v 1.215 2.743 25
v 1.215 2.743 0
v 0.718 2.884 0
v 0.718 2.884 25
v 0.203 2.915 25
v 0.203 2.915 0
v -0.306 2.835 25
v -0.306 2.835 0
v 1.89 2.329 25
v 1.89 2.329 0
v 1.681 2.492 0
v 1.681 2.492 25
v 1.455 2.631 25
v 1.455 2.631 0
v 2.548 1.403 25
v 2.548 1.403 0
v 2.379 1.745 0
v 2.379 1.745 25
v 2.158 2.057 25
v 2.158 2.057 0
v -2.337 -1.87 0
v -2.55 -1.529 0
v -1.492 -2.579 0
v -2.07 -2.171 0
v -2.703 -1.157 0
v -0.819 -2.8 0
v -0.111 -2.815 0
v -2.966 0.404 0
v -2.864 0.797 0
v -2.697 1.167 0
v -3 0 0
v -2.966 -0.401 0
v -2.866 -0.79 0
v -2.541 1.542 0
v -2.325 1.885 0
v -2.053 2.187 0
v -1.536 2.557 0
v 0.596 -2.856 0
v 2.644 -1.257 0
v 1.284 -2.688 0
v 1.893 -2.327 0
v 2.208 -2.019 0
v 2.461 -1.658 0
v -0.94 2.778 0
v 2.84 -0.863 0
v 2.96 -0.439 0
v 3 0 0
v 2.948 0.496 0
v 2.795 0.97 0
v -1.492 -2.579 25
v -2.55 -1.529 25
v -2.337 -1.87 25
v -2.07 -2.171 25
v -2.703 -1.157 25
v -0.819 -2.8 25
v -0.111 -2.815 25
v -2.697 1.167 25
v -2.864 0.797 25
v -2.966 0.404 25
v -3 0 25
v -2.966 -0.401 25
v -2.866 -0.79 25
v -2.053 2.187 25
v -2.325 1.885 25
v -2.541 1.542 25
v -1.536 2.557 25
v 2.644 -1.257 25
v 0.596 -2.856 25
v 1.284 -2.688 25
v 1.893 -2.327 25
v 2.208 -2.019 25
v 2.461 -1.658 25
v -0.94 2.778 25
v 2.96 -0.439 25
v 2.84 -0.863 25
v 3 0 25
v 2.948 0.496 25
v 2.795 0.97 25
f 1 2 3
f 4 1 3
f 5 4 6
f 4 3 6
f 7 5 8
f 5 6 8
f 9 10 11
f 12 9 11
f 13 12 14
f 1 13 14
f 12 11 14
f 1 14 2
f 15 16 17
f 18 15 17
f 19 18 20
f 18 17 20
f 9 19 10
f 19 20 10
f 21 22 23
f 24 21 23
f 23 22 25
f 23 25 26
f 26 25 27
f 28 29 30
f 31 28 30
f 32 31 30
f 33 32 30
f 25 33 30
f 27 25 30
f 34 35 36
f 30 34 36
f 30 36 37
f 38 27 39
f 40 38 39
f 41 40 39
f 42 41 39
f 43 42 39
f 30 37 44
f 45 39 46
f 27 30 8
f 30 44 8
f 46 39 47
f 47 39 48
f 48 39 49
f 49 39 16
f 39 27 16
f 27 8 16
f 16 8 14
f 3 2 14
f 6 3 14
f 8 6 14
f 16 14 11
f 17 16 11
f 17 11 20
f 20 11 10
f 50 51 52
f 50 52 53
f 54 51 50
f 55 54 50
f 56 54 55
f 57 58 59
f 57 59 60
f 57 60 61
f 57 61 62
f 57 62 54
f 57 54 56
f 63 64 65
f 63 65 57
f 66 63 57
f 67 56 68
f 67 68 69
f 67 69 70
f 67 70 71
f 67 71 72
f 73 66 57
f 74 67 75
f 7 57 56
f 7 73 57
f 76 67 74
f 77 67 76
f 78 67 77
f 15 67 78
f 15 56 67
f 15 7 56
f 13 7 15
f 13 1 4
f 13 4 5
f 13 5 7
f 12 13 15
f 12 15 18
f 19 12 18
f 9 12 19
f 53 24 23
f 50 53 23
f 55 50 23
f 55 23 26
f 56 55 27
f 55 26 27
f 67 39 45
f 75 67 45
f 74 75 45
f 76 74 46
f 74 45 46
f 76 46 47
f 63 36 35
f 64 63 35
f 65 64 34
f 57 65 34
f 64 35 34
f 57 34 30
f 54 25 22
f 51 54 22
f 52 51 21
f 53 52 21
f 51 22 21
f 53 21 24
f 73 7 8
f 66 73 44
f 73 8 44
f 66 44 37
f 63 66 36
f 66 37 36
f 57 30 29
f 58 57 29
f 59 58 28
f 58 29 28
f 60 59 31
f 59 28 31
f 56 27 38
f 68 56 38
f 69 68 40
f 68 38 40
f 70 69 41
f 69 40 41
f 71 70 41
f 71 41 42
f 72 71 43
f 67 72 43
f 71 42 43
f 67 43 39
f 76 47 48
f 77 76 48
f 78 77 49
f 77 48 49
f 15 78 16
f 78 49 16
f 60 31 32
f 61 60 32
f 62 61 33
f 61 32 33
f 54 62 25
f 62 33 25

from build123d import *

# Parameters (mm, degrees)
F1_DEPTH = 25


with BuildPart() as f1:
    # F0 (on Top) → F1 (new body)
    with BuildSketch(Plane.XY):
        with BuildLine():
            ThreePointArc((1.2145237572, 2.7431609583), (1.5661560246, 2.5587409612), (1.8903534171, 2.3294986496))
            ThreePointArc((1.8903534171, 2.3294986496), (1.5696282097, 2.5644137181), (1.2145237572, 2.7431609583))
        make_face()
        with BuildLine():
            ThreePointArc((-2.6971494632, 1.1670321884), (-2.9230538866, 0.602843794), (-3, -7.1e-09))
            ThreePointArc((-3, -7.1e-09), (-2.9244950269, -0.5972628147), (-2.7027309452, -1.1569453626))
            ThreePointArc((-2.7027309452, -1.1569453626), (-2.8098534543, -0.5773803496), (-2.7724957206, 0.0108162466))
            ThreePointArc((-2.7724957206, 0.0108162466), (-2.8056442701, 0.5935394007), (-2.6971494632, 1.1670321884))
        make_face()
        with BuildLine():
            ThreePointArc((0, 2.3237900077), (0.5091765934, 2.3982808653), (1.0225286934, 2.3625133869))
            ThreePointArc((1.0225286934, 2.3625133869), (0.3936943594, 2.6986461258), (-0.3061435643, 2.8351917902))
            ThreePointArc((-0.3061435643, 2.8351917902), (-0.8312662298, 2.6250655472), (-1.2926313697, 2.2978820217))
            ThreePointArc((-1.2926313697, 2.2978820217), (-0.6480931242, 2.3995180873), (0, 2.3237900077))
        make_face()
        with BuildLine():
            ThreePointArc((-0.3061435643, 2.8351917902), (-1.2452617924, 2.6877040375), (-2.0534480514, 2.1871736645))
            ThreePointArc((-2.0534480514, 2.1871736645), (-2.4404348522, 1.7182033005), (-2.6971494632, 1.1670321884))
            ThreePointArc((-2.6971494632, 1.1670321884), (-2.1051327551, 1.8693783431), (-1.2926313697, 2.2978820217))
            ThreePointArc((-1.2926313697, 2.2978820217), (-0.8312662298, 2.6250655472), (-0.3061435643, 2.8351917902))
        make_face()
        with BuildLine():
            ThreePointArc((-1.891761125, 1.4569338473), (-2.4638935619, 0.8141244793), (-2.7724957206, 0.0108162466))
            ThreePointArc((-2.7724957206, 0.0108162466), (-2.4250170931, -0.8673747652), (-1.7656165001, -1.5435047142))
            ThreePointArc((-1.7656165001, -1.5435047142), (-1.9902787019, -0.8503911859), (-1.9966041151, -0.1218038835))
            ThreePointArc((-1.9966041151, -0.1218038835), (-2.0780218042, 0.6764531589), (-1.891761125, 1.4569338473))
        make_face()
        with BuildLine():
            ThreePointArc((-1.2926313697, 2.2978820217), (-2.1051327551, 1.8693783431), (-2.6971494632, 1.1670321884))
            ThreePointArc((-2.6971494632, 1.1670321884), (-2.8056442701, 0.5935394007), (-2.7724957206, 0.0108162466))
            ThreePointArc((-2.7724957206, 0.0108162466), (-2.4638935619, 0.8141244793), (-1.891761125, 1.4569338473))
            ThreePointArc((-1.891761125, 1.4569338473), (-1.6379567553, 1.9100098031), (-1.2926313697, 2.2978820217))
        make_face()
        with BuildLine():
            ThreePointArc((-1.6655926226, 0.7918901872), (-1.3317700546, 1.4241714982), (-0.8264971382, 1.930053345))
            ThreePointArc((-0.8264971382, 1.930053345), (-1.3882878833, 1.7591467098), (-1.891761125, 1.4569338473))
            ThreePointArc((-1.891761125, 1.4569338473), (-2.0780218042, 0.6764531589), (-1.9966041151, -0.1218038835))
            ThreePointArc((-1.9966041151, -0.1218038835), (-1.8778287416, 0.3519725497), (-1.6655926226, 0.7918901872))
        make_face()
        with BuildLine():
            ThreePointArc((-0.8264971382, 1.930053345), (-0.4321965911, 2.1666956864), (0, 2.3237900077))
            ThreePointArc((0, 2.3237900077), (-0.6480931242, 2.3995180873), (-1.2926313697, 2.2978820217))
            ThreePointArc((-1.2926313697, 2.2978820217), (-1.6379567553, 1.9100098031), (-1.891761125, 1.4569338473))
            ThreePointArc((-1.891761125, 1.4569338473), (-1.3882878833, 1.7591467098), (-0.8264971382, 1.930053345))
        make_face()
        with BuildLine():
            ThreePointArc((0.8936048083, 1.8786017876), (0.4702071814, 2.1481751765), (0, 2.3237900077))
            ThreePointArc((0, 2.3237900077), (-0.4321965911, 2.1666956864), (-0.8264971382, 1.930053345))
            ThreePointArc((-0.8264971382, 1.930053345), (-0.3748003349, 1.9654238069), (0.0754949738, 1.9152719716))
            ThreePointArc((0.0754949738, 1.9152719716), (0.4861255229, 1.9320891402), (0.8936048083, 1.8786017876))
        make_face()
        with BuildLine():
            ThreePointArc((1.7335505231, 1.5154725868), (1.4274938242, 1.9805057771), (1.0225286934, 2.3625133869))
            ThreePointArc((1.0225286934, 2.3625133869), (0.5091765934, 2.3982808653), (0, 2.3237900077))
            ThreePointArc((0, 2.3237900077), (0.4702071814, 2.1481751765), (0.8936048083, 1.8786017876))
            ThreePointArc((0.8936048083, 1.8786017876), (1.3310447327, 1.7374398538), (1.7335505231, 1.5154725868))
        make_face()
        with BuildLine():
            ThreePointArc((2.5475158106, 1.4025627142), (2.2745813704, 1.90548212), (1.8903534171, 2.3294986496))
            ThreePointArc((1.8903534171, 2.3294986496), (1.5661560246, 2.5587409612), (1.2145237572, 2.7431609583))
            ThreePointArc((1.2145237572, 2.7431609583), (0.4616861922, 2.9130377773), (-0.3061435643, 2.8351917902))
            ThreePointArc((-0.3061435643, 2.8351917902), (0.3936943594, 2.6986461258), (1.0225286934, 2.3625133869))
            ThreePointArc((1.0225286934, 2.3625133869), (1.8785359054, 2.0310947636), (2.5475158106, 1.4025627142))
        make_face()
        with BuildLine():
            ThreePointArc((2.7167033901, 0.5174209492), (2.6740270642, 0.9680040107), (2.5475158106, 1.4025627142))
            ThreePointArc((2.5475158106, 1.4025627142), (1.8785359054, 2.0310947636), (1.0225286934, 2.3625133869))
            ThreePointArc((1.0225286934, 2.3625133869), (1.4274938242, 1.9805057771), (1.7335505231, 1.5154725868))
            ThreePointArc((1.7335505231, 1.5154725868), (2.3316037725, 0.9294886108), (2.6919655931, 0.1737212738))
            ThreePointArc((2.6919655931, 0.1737212738), (2.710510952, 0.3451265605), (2.7167033901, 0.5174209492))
        make_face()
        with BuildLine():
            ThreePointArc((2.6442507105, -1.257393746), (2.9093507427, -0.6533751965), (3, 0))
            ThreePointArc((3, 0), (2.8840794585, 0.7368724633), (2.5475158106, 1.4025627142))
            ThreePointArc((2.5475158106, 1.4025627142), (2.6740270642, 0.9680040107), (2.7167033901, 0.5174209492))
            ThreePointArc((2.7167033901, 0.5174209492), (2.710510952, 0.3451265605), (2.6919655931, 0.1737212738))
            ThreePointArc((2.6919655931, 0.1737212738), (2.7568862112, -0.1429651986), (2.778658088, -0.4655035588))
            ThreePointArc((2.778658088, -0.4655035588), (2.7448176656, -0.8671113936), (2.6442507105, -1.257393746))
        make_face()
        with BuildLine():
            ThreePointArc((-0.1109618815, -2.8150295292), (0.9461488192, -2.7974457257), (1.893131616, -2.3273225438))
            ThreePointArc((1.893131616, -2.3273225438), (2.3429421646, -1.8444843659), (2.6442507105, -1.257393746))
            ThreePointArc((2.6442507105, -1.257393746), (1.9472428841, -1.9861864492), (1.0123721426, -2.3643073438))
            ThreePointArc((1.0123721426, -2.3643073438), (0.4795856786, -2.6616473701), (-0.1109618815, -2.8150295292))
        make_face()
        with BuildLine():
            ThreePointArc((-2.7027309452, -1.1569453626), (-2.450725284, -1.7040017159), (-2.0704500438, -2.1710865568))
            ThreePointArc((-2.0704500438, -2.1710865568), (-1.1634096163, -2.7142918399), (-0.1109618815, -2.8150295292))
            ThreePointArc((-0.1109618815, -2.8150295292), (-0.6405266481, -2.6383501879), (-1.1149467204, -2.3441053464))
            ThreePointArc((-1.1149467204, -2.3441053464), (-2.0371486691, -1.9221351937), (-2.7027309452, -1.1569453626))
        make_face()
        with BuildLine():
            ThreePointArc((-2.7724957206, 0.0108162466), (-2.8098534543, -0.5773803496), (-2.7027309452, -1.1569453626))
            ThreePointArc((-2.7027309452, -1.1569453626), (-2.0371486691, -1.9221351937), (-1.1149467204, -2.3441053464))
            ThreePointArc((-1.1149467204, -2.3441053464), (-1.4838085477, -1.9791805492), (-1.7656165001, -1.5435047142))
            ThreePointArc((-1.7656165001, -1.5435047142), (-2.4250170931, -0.8673747652), (-2.7724957206, 0.0108162466))
        make_face()
        with BuildLine():
            ThreePointArc((-1.7656165001, -1.5435047142), (-1.4838085477, -1.9791805492), (-1.1149467204, -2.3441053464))
            ThreePointArc((-1.1149467204, -2.3441053464), (-0.5562770845, -2.3996016975), (0, -2.3237900077))
            ThreePointArc((0, -2.3237900077), (-0.4359918905, -2.1648835541), (-0.8332527584, -1.9250419555))
            ThreePointArc((-0.8332527584, -1.9250419555), (-1.3196790329, -1.7837446469), (-1.7656165001, -1.5435047142))
        make_face()
        with BuildLine():
            ThreePointArc((-1.9966041151, -0.1218038835), (-1.9902787019, -0.8503911859), (-1.7656165001, -1.5435047142))
            ThreePointArc((-1.7656165001, -1.5435047142), (-1.3196790329, -1.7837446469), (-0.8332527584, -1.9250419555))
            ThreePointArc((-0.8332527584, -1.9250419555), (-1.3043874371, -1.460584982), (-1.6308124206, -0.8851417651))
            ThreePointArc((-1.6308124206, -0.8851417651), (-1.8476267632, -0.5197265753), (-1.9966041151, -0.1218038835))
        make_face()
        with BuildLine():
            ThreePointArc((0.0754949738, 1.9152719716), (-0.922527746, 1.5511559131), (-1.6655926226, 0.7918901872))
            ThreePointArc((-1.6655926226, 0.7918901872), (-1.7994840321, -0.0497632375), (-1.6308124206, -0.8851417651))
            ThreePointArc((-1.6308124206, -0.8851417651), (-0.8236296762, -1.5943651427), (0.2121228894, -1.8802994096))
            ThreePointArc((0.2121228894, -1.8802994096), (1.0659766459, -1.45444691), (1.6864253983, -0.729560757))
            ThreePointArc((1.6864253983, -0.729560757), (1.7714363744, -0.3691741081), (1.8, 0))
            ThreePointArc((1.8, 0), (1.7719880142, 0.3656129927), (1.6886059496, 0.7226913638))
            ThreePointArc((1.6886059496, 0.7226913638), (1.0126310952, 1.4956079282), (0.0754949738, 1.9152719716))
        make_face()
        with BuildLine():
            ThreePointArc((0.0754949738, 1.9152719716), (-0.3748003349, 1.9654238069), (-0.8264971382, 1.930053345))
            ThreePointArc((-0.8264971382, 1.930053345), (-1.3317700546, 1.4241714982), (-1.6655926226, 0.7918901872))
            ThreePointArc((-1.6655926226, 0.7918901872), (-0.922527746, 1.5511559131), (0.0754949738, 1.9152719716))
        make_face()
        with BuildLine():
            ThreePointArc((1.989275935, 0.4374714314), (1.9244696113, 0.9914303598), (1.7335505231, 1.5154725868))
            ThreePointArc((1.7335505231, 1.5154725868), (1.3310447327, 1.7374398538), (0.8936048083, 1.8786017876))
            ThreePointArc((0.8936048083, 1.8786017876), (1.3774508291, 1.3600324329), (1.6886059496, 0.7226913638))
            ThreePointArc((1.6886059496, 0.7226913638), (1.8477938368, 0.3680696241), (1.94764666, -0.007598814))
            ThreePointArc((1.94764666, -0.007598814), (1.9788459528, 0.2139649886), (1.989275935, 0.4374714314))
        make_face()
        with BuildLine():
            ThreePointArc((2.6919655931, 0.1737212738), (2.3316037725, 0.9294886108), (1.7335505231, 1.5154725868))
            ThreePointArc((1.7335505231, 1.5154725868), (1.9244696113, 0.9914303598), (1.989275935, 0.4374714314))
            ThreePointArc((1.989275935, 0.4374714314), (1.9788459528, 0.2139649886), (1.94764666, -0.007598814))
            ThreePointArc((1.94764666, -0.007598814), (1.9762988134, -0.2200718024), (1.9858750044, -0.4342539988))
            ThreePointArc((1.9858750044, -0.4342539988), (1.9375036779, -0.9136730034), (1.7943395194, -1.3737668969))
            ThreePointArc((1.7943395194, -1.3737668969), (2.3927299553, -0.6867857193), (2.6919655931, 0.1737212738))
        make_face()
        with BuildLine():
            ThreePointArc((1.0123721426, -2.3643073438), (1.9472428841, -1.9861864492), (2.6442507105, -1.257393746))
            ThreePointArc((2.6442507105, -1.257393746), (2.7448176656, -0.8671113936), (2.778658088, -0.4655035588))
            ThreePointArc((2.778658088, -0.4655035588), (2.7568862112, -0.1429651986), (2.6919655931, 0.1737212738))
            ThreePointArc((2.6919655931, 0.1737212738), (2.3927299553, -0.6867857193), (1.7943395194, -1.3737668969))
            ThreePointArc((1.7943395194, -1.3737668969), (1.4696290089, -1.9213554918), (1.0123721426, -2.3643073438))
        make_face()
        with BuildLine():
            ThreePointArc((0.2121228894, -1.8802994096), (0.6149363184, -1.8639771949), (1.0093347598, -1.7804610726))
            ThreePointArc((1.0093347598, -1.7804610726), (1.4175070435, -1.2998712742), (1.6864253983, -0.729560757))
            ThreePointArc((1.6864253983, -0.729560757), (1.0659766459, -1.45444691), (0.2121228894, -1.8802994096))
        make_face()
        with BuildLine():
            ThreePointArc((-1.1149467204, -2.3441053464), (-0.6405266481, -2.6383501879), (-0.1109618815, -2.8150295292))
            ThreePointArc((-0.1109618815, -2.8150295292), (0.4795856786, -2.6616473701), (1.0123721426, -2.3643073438))
            ThreePointArc((1.0123721426, -2.3643073438), (0.5040236131, -2.3980801765), (0, -2.3237900077))
            ThreePointArc((0, -2.3237900077), (-0.5562770845, -2.3996016975), (-1.1149467204, -2.3441053464))
        make_face()
        with BuildLine():
            ThreePointArc((0, -2.3237900077), (0.5040236131, -2.3980801765), (1.0123721426, -2.3643073438))
            ThreePointArc((1.0123721426, -2.3643073438), (1.4696290089, -1.9213554918), (1.7943395194, -1.3737668969))
            ThreePointArc((1.7943395194, -1.3737668969), (1.4207257144, -1.6135728818), (1.0093347598, -1.7804610726))
            ThreePointArc((1.0093347598, -1.7804610726), (0.537581471, -2.1132695987), (0, -2.3237900077))
        make_face()
        with BuildLine():
            ThreePointArc((-0.8332527584, -1.9250419555), (-0.4359918905, -2.1648835541), (0, -2.3237900077))
            ThreePointArc((0, -2.3237900077), (0.537581471, -2.1132695987), (1.0093347598, -1.7804610726))
            ThreePointArc((1.0093347598, -1.7804610726), (0.6149363184, -1.8639771949), (0.2121228894, -1.8802994096))
            ThreePointArc((0.2121228894, -1.8802994096), (-0.3080969474, -1.9603333302), (-0.8332527584, -1.9250419555))
        make_face()
        with BuildLine():
            ThreePointArc((-1.6308124206, -0.8851417651), (-1.3043874371, -1.460584982), (-0.8332527584, -1.9250419555))
            ThreePointArc((-0.8332527584, -1.9250419555), (-0.3080969474, -1.9603333302), (0.2121228894, -1.8802994096))
            ThreePointArc((0.2121228894, -1.8802994096), (-0.8236296762, -1.5943651427), (-1.6308124206, -0.8851417651))
        make_face()
        with BuildLine():
            ThreePointArc((-1.6655926226, 0.7918901872), (-1.8778287416, 0.3519725497), (-1.9966041151, -0.1218038835))
            ThreePointArc((-1.9966041151, -0.1218038835), (-1.8476267632, -0.5197265753), (-1.6308124206, -0.8851417651))
            ThreePointArc((-1.6308124206, -0.8851417651), (-1.7994840321, -0.0497632375), (-1.6655926226, 0.7918901872))
        make_face()
        with BuildLine():
            ThreePointArc((1.0093347598, -1.7804610726), (1.4207257144, -1.6135728818), (1.7943395194, -1.3737668969))
            ThreePointArc((1.7943395194, -1.3737668969), (1.9375036779, -0.9136730034), (1.9858750044, -0.4342539988))
            ThreePointArc((1.9858750044, -0.4342539988), (1.9762988134, -0.2200718024), (1.94764666, -0.007598814))
            ThreePointArc((1.94764666, -0.007598814), (1.846092786, -0.3790931412), (1.6864253983, -0.729560757))
            ThreePointArc((1.6864253983, -0.729560757), (1.4175070435, -1.2998712742), (1.0093347598, -1.7804610726))
        make_face()
        with BuildLine():
            ThreePointArc((1.94764666, -0.007598814), (1.8477938368, 0.3680696241), (1.6886059496, 0.7226913638))
            ThreePointArc((1.6886059496, 0.7226913638), (1.7719880142, 0.3656129927), (1.8, 0))
            ThreePointArc((1.8, 0), (1.7714363744, -0.3691741081), (1.6864253983, -0.729560757))
            ThreePointArc((1.6864253983, -0.729560757), (1.846092786, -0.3790931412), (1.94764666, -0.007598814))
        make_face()
        with BuildLine():
            ThreePointArc((1.6886059496, 0.7226913638), (1.3774508291, 1.3600324329), (0.8936048083, 1.8786017876))
            ThreePointArc((0.8936048083, 1.8786017876), (0.4861255229, 1.9320891402), (0.0754949738, 1.9152719716))
            ThreePointArc((0.0754949738, 1.9152719716), (1.0126310952, 1.4956079282), (1.6886059496, 0.7226913638))
        make_face()
    extrude(amount=F1_DEPTH)


solid = f1.part
